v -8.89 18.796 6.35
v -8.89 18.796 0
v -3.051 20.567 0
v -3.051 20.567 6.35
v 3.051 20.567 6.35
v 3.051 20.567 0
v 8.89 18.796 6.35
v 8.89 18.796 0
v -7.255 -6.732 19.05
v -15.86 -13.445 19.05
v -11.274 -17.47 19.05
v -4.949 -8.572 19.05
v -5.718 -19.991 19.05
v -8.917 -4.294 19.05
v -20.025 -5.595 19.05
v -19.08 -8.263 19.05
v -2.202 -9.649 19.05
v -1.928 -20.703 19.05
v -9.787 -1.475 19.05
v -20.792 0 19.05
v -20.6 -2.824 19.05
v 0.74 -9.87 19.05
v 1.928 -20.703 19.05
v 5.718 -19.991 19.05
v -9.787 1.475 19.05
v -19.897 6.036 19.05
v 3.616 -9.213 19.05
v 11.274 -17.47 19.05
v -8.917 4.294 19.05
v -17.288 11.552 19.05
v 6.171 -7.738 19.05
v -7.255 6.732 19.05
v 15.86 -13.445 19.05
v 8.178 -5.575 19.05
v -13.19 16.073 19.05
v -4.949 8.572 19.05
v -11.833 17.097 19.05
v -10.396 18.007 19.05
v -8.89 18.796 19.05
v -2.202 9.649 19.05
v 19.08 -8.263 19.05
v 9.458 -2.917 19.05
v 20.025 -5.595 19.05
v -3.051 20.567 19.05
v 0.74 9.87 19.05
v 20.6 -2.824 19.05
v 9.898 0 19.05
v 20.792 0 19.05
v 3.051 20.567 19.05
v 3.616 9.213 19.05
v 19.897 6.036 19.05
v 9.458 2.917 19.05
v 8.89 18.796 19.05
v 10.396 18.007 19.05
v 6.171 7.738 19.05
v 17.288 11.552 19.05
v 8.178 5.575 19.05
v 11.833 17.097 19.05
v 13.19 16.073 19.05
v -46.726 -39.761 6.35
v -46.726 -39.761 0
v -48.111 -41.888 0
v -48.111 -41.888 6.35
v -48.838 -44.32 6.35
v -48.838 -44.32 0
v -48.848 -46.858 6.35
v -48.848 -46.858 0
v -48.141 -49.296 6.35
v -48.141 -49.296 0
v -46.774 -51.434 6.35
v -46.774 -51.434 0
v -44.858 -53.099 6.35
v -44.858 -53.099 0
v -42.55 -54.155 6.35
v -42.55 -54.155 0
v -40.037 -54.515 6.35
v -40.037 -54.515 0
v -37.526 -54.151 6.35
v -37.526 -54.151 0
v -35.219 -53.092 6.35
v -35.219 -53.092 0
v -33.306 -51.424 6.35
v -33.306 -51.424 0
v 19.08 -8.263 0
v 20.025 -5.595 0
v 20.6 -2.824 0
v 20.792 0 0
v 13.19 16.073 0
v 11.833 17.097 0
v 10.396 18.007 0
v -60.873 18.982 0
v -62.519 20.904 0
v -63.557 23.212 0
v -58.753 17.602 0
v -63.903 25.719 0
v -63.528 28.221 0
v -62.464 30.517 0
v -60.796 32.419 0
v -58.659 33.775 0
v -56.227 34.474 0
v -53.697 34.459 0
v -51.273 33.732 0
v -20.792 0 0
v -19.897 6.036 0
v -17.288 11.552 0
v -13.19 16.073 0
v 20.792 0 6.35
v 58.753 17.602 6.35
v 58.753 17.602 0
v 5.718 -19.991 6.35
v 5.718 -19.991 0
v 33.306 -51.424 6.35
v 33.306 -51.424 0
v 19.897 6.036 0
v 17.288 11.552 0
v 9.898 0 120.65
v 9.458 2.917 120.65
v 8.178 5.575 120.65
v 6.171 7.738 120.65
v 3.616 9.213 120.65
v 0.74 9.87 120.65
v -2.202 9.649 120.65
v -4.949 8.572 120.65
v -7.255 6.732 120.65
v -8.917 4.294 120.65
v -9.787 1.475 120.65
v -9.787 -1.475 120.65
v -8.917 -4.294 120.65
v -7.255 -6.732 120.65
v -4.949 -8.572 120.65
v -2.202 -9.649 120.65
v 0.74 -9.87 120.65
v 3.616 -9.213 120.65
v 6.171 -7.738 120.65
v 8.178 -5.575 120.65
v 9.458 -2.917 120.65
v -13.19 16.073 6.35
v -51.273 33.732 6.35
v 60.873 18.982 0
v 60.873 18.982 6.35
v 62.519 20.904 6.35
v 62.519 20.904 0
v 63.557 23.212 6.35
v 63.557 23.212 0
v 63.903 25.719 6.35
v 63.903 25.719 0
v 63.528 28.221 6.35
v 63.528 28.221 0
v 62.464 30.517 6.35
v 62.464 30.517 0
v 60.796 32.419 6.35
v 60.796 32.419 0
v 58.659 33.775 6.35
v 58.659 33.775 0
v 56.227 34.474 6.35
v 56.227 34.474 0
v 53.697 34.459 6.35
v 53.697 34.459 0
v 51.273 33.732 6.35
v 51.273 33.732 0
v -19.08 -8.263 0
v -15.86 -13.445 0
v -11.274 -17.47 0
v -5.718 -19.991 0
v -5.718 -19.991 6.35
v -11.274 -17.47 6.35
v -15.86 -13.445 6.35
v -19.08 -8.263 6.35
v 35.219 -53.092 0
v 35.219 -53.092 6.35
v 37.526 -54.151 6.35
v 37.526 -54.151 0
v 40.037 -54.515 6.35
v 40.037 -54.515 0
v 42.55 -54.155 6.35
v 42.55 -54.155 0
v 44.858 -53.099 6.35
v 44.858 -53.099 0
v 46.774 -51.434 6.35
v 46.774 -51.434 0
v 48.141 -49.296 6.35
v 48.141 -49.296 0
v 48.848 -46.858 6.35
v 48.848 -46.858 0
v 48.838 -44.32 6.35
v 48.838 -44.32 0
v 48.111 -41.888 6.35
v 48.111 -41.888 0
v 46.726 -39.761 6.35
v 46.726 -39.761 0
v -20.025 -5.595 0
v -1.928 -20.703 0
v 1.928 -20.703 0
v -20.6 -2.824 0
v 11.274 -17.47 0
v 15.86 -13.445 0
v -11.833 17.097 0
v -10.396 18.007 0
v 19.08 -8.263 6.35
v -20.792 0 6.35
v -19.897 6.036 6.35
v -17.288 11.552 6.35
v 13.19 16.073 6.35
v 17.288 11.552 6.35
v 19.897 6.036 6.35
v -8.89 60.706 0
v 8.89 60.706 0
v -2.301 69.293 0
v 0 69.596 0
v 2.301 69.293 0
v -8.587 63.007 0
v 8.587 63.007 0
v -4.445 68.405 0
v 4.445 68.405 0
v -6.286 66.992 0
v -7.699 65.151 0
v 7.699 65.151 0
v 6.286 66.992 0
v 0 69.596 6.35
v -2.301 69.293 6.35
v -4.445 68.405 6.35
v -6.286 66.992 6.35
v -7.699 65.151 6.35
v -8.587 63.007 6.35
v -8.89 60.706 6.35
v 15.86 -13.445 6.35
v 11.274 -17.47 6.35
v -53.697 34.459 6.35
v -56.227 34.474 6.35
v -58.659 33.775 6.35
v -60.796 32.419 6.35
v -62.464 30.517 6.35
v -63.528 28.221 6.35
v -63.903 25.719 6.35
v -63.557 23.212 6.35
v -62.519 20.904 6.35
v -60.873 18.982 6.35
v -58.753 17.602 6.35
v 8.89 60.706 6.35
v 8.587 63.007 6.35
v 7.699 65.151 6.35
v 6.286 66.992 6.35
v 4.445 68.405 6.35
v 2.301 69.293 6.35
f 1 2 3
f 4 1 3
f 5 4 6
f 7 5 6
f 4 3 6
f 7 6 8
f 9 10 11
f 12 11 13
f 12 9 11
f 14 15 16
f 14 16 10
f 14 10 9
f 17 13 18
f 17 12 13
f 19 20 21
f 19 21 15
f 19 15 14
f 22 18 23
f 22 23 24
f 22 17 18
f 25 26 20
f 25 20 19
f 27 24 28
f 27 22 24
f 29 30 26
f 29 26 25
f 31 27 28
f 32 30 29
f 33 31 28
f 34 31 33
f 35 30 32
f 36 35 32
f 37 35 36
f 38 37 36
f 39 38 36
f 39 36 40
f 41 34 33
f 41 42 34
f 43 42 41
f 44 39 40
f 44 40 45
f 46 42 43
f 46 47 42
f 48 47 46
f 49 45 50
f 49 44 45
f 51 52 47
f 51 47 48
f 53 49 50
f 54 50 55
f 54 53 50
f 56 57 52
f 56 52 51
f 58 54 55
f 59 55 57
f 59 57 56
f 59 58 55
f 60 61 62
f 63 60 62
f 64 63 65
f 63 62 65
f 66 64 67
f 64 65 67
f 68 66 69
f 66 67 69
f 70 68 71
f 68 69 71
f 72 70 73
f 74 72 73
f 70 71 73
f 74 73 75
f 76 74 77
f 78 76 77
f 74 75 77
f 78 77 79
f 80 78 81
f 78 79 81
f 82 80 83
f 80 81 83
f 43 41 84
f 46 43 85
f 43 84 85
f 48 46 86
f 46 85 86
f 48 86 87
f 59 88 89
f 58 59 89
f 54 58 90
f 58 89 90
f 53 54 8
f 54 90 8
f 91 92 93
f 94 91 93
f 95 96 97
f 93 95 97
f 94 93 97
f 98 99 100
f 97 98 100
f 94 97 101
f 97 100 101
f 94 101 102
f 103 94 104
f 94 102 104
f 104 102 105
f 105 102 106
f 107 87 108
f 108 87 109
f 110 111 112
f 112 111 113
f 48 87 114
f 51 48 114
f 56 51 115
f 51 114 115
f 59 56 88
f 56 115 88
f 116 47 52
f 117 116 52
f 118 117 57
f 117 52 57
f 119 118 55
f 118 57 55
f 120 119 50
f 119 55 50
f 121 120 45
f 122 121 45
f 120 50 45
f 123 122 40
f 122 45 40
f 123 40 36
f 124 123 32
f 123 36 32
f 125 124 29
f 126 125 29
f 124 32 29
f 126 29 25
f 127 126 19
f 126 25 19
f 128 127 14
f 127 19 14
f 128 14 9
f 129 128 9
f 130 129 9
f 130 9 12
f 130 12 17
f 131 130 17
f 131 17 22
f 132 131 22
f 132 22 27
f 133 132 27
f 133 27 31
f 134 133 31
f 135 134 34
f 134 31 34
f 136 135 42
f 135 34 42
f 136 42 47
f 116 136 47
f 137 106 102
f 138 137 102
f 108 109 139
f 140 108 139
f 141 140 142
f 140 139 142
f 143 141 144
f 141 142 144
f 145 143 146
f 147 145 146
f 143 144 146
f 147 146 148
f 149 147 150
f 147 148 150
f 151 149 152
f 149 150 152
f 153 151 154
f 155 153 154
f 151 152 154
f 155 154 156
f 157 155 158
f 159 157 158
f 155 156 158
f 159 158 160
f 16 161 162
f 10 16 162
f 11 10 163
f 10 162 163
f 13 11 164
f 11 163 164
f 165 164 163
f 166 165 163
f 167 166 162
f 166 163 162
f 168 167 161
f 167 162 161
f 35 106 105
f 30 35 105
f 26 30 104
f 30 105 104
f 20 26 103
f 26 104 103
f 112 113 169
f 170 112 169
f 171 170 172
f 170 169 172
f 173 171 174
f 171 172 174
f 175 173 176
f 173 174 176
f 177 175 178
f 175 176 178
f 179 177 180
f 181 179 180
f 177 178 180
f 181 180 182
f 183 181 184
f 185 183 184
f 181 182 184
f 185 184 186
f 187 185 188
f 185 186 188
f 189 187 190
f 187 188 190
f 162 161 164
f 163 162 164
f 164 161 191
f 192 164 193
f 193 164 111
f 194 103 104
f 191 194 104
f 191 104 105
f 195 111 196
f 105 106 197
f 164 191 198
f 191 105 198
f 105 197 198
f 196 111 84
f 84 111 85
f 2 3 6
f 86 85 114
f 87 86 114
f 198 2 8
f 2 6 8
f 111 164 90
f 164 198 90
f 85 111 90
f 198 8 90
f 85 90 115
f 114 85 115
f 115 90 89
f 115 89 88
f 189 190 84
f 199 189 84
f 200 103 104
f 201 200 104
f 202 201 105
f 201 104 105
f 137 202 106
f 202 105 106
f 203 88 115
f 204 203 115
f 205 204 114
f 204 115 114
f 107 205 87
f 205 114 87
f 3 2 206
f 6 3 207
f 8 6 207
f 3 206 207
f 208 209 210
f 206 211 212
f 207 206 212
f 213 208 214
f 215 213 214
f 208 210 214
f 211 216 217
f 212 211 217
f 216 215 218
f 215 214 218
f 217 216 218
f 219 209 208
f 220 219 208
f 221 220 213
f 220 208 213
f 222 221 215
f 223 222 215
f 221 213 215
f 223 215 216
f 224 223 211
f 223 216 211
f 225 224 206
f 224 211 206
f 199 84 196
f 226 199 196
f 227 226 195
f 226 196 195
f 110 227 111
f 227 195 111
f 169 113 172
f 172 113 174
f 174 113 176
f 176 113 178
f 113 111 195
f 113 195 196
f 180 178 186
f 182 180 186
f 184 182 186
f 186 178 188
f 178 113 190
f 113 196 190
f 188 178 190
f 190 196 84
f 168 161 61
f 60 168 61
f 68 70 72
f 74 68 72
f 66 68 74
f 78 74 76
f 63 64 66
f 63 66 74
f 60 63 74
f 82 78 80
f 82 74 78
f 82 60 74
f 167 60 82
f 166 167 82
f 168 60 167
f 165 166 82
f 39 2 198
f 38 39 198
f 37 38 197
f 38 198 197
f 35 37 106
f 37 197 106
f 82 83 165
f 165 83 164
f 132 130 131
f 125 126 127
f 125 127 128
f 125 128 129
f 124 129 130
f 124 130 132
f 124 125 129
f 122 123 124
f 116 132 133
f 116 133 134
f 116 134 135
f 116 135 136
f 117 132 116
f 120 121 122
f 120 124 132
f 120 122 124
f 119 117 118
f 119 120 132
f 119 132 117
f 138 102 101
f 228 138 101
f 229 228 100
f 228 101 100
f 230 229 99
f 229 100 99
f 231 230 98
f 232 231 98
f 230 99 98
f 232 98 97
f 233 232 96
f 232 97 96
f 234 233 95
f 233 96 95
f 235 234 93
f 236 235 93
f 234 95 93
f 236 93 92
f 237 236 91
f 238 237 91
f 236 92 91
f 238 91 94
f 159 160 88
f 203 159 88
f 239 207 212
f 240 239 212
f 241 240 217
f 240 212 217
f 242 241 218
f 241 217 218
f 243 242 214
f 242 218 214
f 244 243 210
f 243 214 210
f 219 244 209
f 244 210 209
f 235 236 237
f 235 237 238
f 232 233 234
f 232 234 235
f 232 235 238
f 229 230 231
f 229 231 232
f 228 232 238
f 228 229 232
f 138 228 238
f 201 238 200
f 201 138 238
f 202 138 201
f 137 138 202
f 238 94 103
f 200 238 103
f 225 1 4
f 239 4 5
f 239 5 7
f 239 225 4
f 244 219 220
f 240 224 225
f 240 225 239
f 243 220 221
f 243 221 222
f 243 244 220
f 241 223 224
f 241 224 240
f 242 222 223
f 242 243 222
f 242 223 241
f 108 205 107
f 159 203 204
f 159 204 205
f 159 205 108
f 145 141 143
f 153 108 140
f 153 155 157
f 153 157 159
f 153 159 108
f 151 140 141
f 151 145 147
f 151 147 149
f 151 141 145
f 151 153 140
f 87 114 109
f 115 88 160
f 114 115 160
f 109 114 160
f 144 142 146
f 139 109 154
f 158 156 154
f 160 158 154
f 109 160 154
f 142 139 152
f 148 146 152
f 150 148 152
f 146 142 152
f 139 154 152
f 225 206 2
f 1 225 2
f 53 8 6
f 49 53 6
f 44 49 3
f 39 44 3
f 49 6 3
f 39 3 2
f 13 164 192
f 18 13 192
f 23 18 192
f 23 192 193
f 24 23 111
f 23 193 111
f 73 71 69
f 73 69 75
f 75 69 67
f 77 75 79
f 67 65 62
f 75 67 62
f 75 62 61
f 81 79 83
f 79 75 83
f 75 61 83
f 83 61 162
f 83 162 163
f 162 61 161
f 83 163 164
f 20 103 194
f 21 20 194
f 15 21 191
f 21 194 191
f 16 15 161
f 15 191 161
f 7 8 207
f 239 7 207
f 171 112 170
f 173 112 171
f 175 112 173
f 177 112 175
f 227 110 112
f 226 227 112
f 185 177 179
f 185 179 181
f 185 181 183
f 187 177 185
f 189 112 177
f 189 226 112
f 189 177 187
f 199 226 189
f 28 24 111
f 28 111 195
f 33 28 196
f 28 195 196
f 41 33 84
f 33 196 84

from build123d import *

# Parameters (mm, degrees)
F1_DEPTH = 6.35
F2_DEPTH = 19.05
F3_R     = 9.89756
F4_DEPTH = 101.6


with BuildPart() as f1:
    # F0 (on Top) → F1 (new body)
    with BuildSketch(Plane.XY):
        with BuildLine():
            ThreePointArc((-20.792348, 0), (-18.795878, 8.890258), (-13.189869, 16.073241))
            Line((-13.189869, 16.073241), (-51.273122, 33.732253))
            ThreePointArc((-51.273122, 33.732253), (-63.07801, 29.406884), (-58.752641, 17.601996))
            Line((-58.752641, 17.601996), (-20.792348, 0))
        make_face()
        with BuildLine():
            ThreePointArc((-8.89, 18.796), (0, 20.792348), (8.89, 18.796))
            Line((8.89, 18.796), (8.89, 60.706))
            ThreePointArc((8.89, 60.706), (6.286179, 66.992179), (0, 69.596))
            ThreePointArc((0, 69.596), (-6.286179, 66.992179), (-8.89, 60.706))
            Line((-8.89, 60.706), (-8.89, 18.796))
        make_face()
        with BuildLine():
            ThreePointArc((13.189869, 16.073241), (18.795878, 8.890258), (20.792348, 0))
            Line((20.792348, 0), (58.752641, 17.601996))
            ThreePointArc((58.752641, 17.601996), (63.07801, 29.406884), (51.273122, 33.732253))
            Line((51.273122, 33.732253), (13.189869, 16.073241))
        make_face()
        with BuildLine():
            Line((46.725719, -39.761259), (19.080166, -8.262505))
            ThreePointArc((19.080166, -8.262505), (13.715661, -15.626976), (5.717509, -19.990793))
            Line((5.717509, -19.990793), (33.305679, -51.424164))
            ThreePointArc((33.305679, -51.424164), (45.875688, -52.335567), (46.725719, -39.761259))
        make_face()
        with BuildLine():
            Line((-33.305679, -51.424164), (-5.717509, -19.990793))
            ThreePointArc((-5.717509, -19.990793), (-13.715661, -15.626976), (-19.080166, -8.262505))
            Line((-19.080166, -8.262505), (-46.725719, -39.761259))
            ThreePointArc((-46.725719, -39.761259), (-45.875688, -52.335567), (-33.305679, -51.424164))
        make_face()
    extrude(amount=F1_DEPTH)


with BuildPart() as f2:
    # F0 (on Top) → F2 (new body)
    with BuildSketch(Plane.XY):
        with BuildLine():
            ThreePointArc((19.080166, -8.262505), (20.359803, -4.219021), (20.792348, 0))
            ThreePointArc((20.792348, 0), (18.795878, 8.890258), (13.189869, 16.073241))
            ThreePointArc((13.189869, 16.073241), (11.123556, 17.566679), (8.89, 18.796))
            ThreePointArc((8.89, 18.796), (0, 20.792348), (-8.89, 18.796))
            ThreePointArc((-8.89, 18.796), (-11.123556, 17.566679), (-13.189869, 16.073241))
            ThreePointArc((-13.189869, 16.073241), (-18.795878, 8.890258), (-20.792348, 0))
            ThreePointArc((-20.792348, 0), (-20.359803, -4.219021), (-19.080166, -8.262505))
            ThreePointArc((-19.080166, -8.262505), (-13.715661, -15.626976), (-5.717509, -19.990793))
            ThreePointArc((-5.717509, -19.990793), (0, -20.792348), (5.717509, -19.990793))
            ThreePointArc((5.717509, -19.990793), (13.715661, -15.626976), (19.080166, -8.262505))
        make_face()
    extrude(amount=F2_DEPTH)

    # F3 (on face) → F4 (join)
    with BuildSketch(Plane.XY.offset(19.05)):
        Circle(F3_R)
    extrude(amount=F4_DEPTH)


solid = Compound([f1.part, f2.part])
